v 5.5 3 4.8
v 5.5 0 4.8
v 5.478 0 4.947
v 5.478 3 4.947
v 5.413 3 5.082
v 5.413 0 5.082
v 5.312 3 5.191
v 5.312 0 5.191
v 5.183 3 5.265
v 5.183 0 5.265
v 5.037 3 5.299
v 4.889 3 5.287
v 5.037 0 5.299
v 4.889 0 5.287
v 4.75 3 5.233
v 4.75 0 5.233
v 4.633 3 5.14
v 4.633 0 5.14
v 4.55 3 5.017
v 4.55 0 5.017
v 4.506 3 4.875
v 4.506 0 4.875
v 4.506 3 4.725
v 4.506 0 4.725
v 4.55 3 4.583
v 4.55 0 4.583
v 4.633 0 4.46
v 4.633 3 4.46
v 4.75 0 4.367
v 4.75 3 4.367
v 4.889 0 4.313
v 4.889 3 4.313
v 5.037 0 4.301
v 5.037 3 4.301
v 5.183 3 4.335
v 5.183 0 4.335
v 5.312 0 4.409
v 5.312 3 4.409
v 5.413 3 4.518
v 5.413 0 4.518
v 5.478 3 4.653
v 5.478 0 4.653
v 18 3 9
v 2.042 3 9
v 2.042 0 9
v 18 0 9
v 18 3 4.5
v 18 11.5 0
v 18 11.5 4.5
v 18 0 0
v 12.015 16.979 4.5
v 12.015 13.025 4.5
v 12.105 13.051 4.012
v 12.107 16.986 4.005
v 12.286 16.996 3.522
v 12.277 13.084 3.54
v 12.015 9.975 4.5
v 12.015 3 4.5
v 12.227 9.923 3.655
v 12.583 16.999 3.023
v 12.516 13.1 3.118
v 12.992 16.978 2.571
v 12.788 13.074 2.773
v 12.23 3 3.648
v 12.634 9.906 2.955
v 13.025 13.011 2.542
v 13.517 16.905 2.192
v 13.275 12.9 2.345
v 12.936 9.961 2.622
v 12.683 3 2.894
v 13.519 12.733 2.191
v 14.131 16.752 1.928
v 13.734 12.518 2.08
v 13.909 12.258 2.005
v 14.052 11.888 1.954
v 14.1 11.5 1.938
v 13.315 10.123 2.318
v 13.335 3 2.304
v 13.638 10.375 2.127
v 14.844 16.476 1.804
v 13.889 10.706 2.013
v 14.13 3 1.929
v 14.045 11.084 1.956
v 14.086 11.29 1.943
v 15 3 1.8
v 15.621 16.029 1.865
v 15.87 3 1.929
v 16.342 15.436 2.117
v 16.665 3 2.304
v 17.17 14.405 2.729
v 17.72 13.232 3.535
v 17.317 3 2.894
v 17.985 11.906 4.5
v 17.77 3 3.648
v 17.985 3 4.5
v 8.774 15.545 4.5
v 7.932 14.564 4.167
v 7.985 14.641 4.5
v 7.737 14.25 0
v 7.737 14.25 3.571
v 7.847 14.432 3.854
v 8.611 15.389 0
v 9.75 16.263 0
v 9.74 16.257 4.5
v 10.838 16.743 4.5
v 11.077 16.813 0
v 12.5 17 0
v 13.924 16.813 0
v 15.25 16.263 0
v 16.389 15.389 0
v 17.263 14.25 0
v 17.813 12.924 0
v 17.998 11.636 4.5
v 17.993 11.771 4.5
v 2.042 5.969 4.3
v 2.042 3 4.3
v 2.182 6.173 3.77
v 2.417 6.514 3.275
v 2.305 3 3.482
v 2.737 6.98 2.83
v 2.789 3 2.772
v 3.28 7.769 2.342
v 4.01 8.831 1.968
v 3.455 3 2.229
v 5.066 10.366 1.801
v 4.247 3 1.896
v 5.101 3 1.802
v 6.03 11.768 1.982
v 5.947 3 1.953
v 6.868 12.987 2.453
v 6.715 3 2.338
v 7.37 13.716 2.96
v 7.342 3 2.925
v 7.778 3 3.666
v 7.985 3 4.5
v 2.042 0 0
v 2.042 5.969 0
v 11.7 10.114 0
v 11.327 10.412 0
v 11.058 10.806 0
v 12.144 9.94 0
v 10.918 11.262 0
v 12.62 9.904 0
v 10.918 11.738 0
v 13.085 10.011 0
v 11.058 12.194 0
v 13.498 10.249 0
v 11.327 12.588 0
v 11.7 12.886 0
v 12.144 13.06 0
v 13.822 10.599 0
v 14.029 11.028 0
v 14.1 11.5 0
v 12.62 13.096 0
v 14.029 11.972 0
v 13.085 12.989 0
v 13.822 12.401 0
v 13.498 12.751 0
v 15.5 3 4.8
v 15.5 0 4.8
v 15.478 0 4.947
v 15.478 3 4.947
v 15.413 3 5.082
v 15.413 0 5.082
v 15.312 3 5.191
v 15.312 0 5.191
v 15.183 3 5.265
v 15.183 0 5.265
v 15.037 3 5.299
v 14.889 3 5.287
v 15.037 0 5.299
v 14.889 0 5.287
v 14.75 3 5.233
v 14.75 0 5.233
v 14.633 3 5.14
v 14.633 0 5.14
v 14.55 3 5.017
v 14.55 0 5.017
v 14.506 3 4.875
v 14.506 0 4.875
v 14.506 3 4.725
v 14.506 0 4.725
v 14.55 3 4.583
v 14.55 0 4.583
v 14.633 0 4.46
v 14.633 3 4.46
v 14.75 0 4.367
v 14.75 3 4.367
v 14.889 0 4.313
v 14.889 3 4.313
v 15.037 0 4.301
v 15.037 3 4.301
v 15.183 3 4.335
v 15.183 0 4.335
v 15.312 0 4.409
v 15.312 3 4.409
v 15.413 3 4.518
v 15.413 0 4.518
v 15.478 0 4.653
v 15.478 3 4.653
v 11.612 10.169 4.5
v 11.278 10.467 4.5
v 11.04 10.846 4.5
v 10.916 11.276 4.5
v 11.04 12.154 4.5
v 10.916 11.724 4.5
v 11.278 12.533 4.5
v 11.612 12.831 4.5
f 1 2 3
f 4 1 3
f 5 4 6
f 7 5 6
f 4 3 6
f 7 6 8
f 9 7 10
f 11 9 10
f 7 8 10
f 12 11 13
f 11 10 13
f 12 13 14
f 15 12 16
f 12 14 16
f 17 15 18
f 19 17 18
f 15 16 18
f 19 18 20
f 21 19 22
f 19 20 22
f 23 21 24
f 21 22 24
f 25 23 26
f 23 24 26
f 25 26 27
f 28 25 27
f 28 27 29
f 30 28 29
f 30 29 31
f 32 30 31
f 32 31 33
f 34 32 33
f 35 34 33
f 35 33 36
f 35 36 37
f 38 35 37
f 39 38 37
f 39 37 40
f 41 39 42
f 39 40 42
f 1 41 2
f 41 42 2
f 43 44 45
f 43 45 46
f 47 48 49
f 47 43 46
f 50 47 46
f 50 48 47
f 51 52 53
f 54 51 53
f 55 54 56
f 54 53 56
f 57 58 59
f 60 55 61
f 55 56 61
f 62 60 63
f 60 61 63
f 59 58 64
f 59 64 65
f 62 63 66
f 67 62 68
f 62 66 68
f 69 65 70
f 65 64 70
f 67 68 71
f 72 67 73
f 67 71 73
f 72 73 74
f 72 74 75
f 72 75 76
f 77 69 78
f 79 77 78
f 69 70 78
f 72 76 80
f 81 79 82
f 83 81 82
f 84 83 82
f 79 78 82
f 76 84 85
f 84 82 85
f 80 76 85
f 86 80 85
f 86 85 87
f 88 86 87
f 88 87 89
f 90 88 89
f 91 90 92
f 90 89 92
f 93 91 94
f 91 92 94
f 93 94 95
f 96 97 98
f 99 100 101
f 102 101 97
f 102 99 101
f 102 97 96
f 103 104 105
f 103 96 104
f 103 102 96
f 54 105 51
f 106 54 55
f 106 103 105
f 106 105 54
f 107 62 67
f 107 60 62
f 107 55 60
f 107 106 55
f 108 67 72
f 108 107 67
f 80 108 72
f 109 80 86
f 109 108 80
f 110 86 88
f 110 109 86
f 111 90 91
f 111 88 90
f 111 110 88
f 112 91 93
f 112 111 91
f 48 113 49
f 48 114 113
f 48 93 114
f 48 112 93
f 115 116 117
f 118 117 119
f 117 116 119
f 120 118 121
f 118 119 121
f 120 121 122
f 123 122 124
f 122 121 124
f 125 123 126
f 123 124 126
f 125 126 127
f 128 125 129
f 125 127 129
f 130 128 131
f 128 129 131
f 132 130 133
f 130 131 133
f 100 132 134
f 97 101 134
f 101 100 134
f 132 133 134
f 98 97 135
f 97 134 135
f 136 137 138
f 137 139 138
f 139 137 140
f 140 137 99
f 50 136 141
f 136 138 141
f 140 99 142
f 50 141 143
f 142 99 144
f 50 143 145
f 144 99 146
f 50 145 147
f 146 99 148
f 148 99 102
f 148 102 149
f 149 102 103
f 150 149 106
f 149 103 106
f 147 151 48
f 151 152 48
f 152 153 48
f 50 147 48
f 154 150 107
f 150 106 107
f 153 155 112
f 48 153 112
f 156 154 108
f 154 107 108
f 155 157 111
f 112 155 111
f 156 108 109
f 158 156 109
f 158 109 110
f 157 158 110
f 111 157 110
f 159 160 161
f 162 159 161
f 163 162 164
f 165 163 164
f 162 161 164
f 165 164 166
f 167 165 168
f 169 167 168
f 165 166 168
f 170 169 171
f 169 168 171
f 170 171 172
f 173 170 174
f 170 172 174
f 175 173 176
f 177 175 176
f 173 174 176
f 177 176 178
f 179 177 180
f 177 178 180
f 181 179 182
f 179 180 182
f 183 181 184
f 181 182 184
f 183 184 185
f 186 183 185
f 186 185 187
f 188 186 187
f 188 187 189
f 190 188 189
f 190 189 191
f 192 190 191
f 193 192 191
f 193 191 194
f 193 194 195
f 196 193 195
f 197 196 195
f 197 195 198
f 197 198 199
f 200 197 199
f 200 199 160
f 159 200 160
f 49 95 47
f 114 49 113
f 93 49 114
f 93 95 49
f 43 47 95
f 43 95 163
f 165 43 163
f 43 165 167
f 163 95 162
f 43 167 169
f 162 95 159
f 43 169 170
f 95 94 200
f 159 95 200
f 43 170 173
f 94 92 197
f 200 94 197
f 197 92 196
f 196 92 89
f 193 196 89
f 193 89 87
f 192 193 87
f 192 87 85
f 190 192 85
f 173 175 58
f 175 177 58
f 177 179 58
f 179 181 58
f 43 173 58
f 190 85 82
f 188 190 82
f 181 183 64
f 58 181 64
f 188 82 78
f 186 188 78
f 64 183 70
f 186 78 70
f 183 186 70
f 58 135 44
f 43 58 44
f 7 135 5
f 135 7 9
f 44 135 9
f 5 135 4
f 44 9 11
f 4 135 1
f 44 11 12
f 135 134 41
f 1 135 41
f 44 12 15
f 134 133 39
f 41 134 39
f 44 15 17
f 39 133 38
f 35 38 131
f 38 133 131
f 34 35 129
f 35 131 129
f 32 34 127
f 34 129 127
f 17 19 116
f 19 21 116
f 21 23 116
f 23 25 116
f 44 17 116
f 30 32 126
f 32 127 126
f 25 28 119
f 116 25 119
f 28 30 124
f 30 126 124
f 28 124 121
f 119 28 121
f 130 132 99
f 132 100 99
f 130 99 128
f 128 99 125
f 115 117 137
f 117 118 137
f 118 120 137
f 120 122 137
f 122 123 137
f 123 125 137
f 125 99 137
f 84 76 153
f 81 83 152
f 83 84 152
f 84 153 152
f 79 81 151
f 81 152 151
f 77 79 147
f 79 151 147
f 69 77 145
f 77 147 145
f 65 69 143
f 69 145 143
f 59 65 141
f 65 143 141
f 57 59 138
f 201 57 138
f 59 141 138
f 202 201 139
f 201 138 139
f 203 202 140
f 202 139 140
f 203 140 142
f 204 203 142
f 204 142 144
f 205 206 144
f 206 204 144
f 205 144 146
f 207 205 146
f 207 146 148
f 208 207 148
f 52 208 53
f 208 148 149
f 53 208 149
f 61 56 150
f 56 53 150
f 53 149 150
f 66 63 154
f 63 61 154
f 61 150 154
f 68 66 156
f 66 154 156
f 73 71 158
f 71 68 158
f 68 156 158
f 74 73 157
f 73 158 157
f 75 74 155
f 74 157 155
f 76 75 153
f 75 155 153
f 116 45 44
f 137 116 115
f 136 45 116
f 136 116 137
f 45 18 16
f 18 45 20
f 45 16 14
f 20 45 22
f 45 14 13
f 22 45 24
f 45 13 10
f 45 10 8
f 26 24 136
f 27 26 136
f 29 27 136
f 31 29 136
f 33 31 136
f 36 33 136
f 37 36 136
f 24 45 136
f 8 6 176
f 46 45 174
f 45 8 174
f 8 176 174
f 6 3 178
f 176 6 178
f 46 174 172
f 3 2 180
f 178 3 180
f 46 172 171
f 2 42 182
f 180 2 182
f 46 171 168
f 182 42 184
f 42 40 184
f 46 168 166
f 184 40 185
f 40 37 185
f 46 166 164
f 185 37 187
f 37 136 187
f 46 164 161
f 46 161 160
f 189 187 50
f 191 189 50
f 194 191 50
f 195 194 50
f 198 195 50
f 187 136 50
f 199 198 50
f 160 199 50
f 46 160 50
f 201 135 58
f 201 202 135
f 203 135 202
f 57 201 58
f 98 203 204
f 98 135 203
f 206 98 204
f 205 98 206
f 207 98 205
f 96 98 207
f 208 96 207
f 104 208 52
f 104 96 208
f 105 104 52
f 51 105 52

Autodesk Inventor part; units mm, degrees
ref_plane "YZ Plane" through (0, 0, 0) normal (1, 0, 0) x (0, 1, 0)
ref_plane "XZ Plane" through (0, 0, 0) normal (0, 1, 0) x (-1, 0, 0)
ref_plane "XY Plane" through (0, 0, 0) normal (0, 0, 1) x (1, 0, 0)
sketch "Sketch1" plane through (0, 0, 0) normal (0, 0, 1) x (1, 0, 0)
  circle A0 centre (12.5, 11.5) radius 1.6
  line L0 (0, 0) -> (18, 0)
  line L1 (0, 0) -> (0, 3)
  arc A1 (18, 11.5) -> (7.7369, 14.25) centre (12.5, 11.5) ccw
  line L2 (12.5, 11.5) -> (7.7369, 14.25) construction
  line L3 (12.5, 11.5) -> (18, 11.5) construction
  line L4 (7.7369, 14.25) -> (0, 3)
  line L5 (18, 11.5) -> (18, 0)
  dimension "d17" = 3
  dimension "d19" = 11.5
  dimension "d23" = 90
  dimension "d25" = 12.5
  dimension "d31" = 5.5
  dimension "d32" = 150
extrude "Extrusion1" add sketch "Sketch1" along normal blind 4.5
sketch "Sketch4" plane through (0, 0, 4.5) normal (0, 0, 1) x (1, 0, 0)
  line L0 (0, 3) -> (0, 0) projected
  line L1 (18, 0) -> (18, 3)
  line L2 (0, 0) -> (18, 0)
  line L3 (18, 0) -> (18, 3)
  line L4 (18, 3) -> (0, 3)
  line L5 (0, 3) -> (0, 0)
  line L6 (18, 0) -> (18, 11.5) projected
extrude "Extrusion2" add sketch "Sketch4" along normal blind 4.5
sketch "Sketch5" plane through (0, 0, 0) normal (0, -1, 0) x (1, 0, 0)
  circle A0 centre (5, 4.8) radius 0.5
  circle A1 centre (15, 4.8) radius 0.5
  line L0 (0, 0) -> (18, 0) projected
  point P0 (20.0001, 0)
  dimension "d13" = 1
  dimension "d14" = 1
  dimension "d38" = 4.8
  dimension "d39" = 4.8
extrude "Extrusion3" cut sketch "Sketch5" against normal through all
sketch "Sketch6" plane through (0, 3, 9) normal (0, 1, 0) x (1, 0, 0)
  circle A0 centre (5, 4.2) radius 0.5 projected
  circle A1 centre (5, 4.2) radius 3
  circle A2 centre (15, 4.2) radius 0.5 projected
  circle A3 centre (15, 4.2) radius 3
  line L0 (0, 9) -> (18, 9) projected
  point P0 (20.0001, 9)
  dimension "d34" = 6
  dimension "d35" = 6
  dimension "d40" = 4.8
  dimension "d41" = 4.8
extrude "Extrusion4" cut sketch "Sketch6" along normal up to next
sketch "Sketch7" plane through (0, 0, 0) normal (0, -1, 0) x (1, 0, 0)
  line L0 (0, 0) -> (0, 9) projected
  line L1 (2.042, 0) -> (0, 0)
  line L2 (0, 0) -> (0, 9)
  line L3 (0, 9) -> (2.042, 9)
  line L4 (2.042, 9) -> (2.042, 0)
extrude "Extrusion5" cut sketch "Sketch7" against normal up to next
properties part number "lower_deck_shaft_mount_v2_printing_inna_plaszczyzna_jako_baza"
